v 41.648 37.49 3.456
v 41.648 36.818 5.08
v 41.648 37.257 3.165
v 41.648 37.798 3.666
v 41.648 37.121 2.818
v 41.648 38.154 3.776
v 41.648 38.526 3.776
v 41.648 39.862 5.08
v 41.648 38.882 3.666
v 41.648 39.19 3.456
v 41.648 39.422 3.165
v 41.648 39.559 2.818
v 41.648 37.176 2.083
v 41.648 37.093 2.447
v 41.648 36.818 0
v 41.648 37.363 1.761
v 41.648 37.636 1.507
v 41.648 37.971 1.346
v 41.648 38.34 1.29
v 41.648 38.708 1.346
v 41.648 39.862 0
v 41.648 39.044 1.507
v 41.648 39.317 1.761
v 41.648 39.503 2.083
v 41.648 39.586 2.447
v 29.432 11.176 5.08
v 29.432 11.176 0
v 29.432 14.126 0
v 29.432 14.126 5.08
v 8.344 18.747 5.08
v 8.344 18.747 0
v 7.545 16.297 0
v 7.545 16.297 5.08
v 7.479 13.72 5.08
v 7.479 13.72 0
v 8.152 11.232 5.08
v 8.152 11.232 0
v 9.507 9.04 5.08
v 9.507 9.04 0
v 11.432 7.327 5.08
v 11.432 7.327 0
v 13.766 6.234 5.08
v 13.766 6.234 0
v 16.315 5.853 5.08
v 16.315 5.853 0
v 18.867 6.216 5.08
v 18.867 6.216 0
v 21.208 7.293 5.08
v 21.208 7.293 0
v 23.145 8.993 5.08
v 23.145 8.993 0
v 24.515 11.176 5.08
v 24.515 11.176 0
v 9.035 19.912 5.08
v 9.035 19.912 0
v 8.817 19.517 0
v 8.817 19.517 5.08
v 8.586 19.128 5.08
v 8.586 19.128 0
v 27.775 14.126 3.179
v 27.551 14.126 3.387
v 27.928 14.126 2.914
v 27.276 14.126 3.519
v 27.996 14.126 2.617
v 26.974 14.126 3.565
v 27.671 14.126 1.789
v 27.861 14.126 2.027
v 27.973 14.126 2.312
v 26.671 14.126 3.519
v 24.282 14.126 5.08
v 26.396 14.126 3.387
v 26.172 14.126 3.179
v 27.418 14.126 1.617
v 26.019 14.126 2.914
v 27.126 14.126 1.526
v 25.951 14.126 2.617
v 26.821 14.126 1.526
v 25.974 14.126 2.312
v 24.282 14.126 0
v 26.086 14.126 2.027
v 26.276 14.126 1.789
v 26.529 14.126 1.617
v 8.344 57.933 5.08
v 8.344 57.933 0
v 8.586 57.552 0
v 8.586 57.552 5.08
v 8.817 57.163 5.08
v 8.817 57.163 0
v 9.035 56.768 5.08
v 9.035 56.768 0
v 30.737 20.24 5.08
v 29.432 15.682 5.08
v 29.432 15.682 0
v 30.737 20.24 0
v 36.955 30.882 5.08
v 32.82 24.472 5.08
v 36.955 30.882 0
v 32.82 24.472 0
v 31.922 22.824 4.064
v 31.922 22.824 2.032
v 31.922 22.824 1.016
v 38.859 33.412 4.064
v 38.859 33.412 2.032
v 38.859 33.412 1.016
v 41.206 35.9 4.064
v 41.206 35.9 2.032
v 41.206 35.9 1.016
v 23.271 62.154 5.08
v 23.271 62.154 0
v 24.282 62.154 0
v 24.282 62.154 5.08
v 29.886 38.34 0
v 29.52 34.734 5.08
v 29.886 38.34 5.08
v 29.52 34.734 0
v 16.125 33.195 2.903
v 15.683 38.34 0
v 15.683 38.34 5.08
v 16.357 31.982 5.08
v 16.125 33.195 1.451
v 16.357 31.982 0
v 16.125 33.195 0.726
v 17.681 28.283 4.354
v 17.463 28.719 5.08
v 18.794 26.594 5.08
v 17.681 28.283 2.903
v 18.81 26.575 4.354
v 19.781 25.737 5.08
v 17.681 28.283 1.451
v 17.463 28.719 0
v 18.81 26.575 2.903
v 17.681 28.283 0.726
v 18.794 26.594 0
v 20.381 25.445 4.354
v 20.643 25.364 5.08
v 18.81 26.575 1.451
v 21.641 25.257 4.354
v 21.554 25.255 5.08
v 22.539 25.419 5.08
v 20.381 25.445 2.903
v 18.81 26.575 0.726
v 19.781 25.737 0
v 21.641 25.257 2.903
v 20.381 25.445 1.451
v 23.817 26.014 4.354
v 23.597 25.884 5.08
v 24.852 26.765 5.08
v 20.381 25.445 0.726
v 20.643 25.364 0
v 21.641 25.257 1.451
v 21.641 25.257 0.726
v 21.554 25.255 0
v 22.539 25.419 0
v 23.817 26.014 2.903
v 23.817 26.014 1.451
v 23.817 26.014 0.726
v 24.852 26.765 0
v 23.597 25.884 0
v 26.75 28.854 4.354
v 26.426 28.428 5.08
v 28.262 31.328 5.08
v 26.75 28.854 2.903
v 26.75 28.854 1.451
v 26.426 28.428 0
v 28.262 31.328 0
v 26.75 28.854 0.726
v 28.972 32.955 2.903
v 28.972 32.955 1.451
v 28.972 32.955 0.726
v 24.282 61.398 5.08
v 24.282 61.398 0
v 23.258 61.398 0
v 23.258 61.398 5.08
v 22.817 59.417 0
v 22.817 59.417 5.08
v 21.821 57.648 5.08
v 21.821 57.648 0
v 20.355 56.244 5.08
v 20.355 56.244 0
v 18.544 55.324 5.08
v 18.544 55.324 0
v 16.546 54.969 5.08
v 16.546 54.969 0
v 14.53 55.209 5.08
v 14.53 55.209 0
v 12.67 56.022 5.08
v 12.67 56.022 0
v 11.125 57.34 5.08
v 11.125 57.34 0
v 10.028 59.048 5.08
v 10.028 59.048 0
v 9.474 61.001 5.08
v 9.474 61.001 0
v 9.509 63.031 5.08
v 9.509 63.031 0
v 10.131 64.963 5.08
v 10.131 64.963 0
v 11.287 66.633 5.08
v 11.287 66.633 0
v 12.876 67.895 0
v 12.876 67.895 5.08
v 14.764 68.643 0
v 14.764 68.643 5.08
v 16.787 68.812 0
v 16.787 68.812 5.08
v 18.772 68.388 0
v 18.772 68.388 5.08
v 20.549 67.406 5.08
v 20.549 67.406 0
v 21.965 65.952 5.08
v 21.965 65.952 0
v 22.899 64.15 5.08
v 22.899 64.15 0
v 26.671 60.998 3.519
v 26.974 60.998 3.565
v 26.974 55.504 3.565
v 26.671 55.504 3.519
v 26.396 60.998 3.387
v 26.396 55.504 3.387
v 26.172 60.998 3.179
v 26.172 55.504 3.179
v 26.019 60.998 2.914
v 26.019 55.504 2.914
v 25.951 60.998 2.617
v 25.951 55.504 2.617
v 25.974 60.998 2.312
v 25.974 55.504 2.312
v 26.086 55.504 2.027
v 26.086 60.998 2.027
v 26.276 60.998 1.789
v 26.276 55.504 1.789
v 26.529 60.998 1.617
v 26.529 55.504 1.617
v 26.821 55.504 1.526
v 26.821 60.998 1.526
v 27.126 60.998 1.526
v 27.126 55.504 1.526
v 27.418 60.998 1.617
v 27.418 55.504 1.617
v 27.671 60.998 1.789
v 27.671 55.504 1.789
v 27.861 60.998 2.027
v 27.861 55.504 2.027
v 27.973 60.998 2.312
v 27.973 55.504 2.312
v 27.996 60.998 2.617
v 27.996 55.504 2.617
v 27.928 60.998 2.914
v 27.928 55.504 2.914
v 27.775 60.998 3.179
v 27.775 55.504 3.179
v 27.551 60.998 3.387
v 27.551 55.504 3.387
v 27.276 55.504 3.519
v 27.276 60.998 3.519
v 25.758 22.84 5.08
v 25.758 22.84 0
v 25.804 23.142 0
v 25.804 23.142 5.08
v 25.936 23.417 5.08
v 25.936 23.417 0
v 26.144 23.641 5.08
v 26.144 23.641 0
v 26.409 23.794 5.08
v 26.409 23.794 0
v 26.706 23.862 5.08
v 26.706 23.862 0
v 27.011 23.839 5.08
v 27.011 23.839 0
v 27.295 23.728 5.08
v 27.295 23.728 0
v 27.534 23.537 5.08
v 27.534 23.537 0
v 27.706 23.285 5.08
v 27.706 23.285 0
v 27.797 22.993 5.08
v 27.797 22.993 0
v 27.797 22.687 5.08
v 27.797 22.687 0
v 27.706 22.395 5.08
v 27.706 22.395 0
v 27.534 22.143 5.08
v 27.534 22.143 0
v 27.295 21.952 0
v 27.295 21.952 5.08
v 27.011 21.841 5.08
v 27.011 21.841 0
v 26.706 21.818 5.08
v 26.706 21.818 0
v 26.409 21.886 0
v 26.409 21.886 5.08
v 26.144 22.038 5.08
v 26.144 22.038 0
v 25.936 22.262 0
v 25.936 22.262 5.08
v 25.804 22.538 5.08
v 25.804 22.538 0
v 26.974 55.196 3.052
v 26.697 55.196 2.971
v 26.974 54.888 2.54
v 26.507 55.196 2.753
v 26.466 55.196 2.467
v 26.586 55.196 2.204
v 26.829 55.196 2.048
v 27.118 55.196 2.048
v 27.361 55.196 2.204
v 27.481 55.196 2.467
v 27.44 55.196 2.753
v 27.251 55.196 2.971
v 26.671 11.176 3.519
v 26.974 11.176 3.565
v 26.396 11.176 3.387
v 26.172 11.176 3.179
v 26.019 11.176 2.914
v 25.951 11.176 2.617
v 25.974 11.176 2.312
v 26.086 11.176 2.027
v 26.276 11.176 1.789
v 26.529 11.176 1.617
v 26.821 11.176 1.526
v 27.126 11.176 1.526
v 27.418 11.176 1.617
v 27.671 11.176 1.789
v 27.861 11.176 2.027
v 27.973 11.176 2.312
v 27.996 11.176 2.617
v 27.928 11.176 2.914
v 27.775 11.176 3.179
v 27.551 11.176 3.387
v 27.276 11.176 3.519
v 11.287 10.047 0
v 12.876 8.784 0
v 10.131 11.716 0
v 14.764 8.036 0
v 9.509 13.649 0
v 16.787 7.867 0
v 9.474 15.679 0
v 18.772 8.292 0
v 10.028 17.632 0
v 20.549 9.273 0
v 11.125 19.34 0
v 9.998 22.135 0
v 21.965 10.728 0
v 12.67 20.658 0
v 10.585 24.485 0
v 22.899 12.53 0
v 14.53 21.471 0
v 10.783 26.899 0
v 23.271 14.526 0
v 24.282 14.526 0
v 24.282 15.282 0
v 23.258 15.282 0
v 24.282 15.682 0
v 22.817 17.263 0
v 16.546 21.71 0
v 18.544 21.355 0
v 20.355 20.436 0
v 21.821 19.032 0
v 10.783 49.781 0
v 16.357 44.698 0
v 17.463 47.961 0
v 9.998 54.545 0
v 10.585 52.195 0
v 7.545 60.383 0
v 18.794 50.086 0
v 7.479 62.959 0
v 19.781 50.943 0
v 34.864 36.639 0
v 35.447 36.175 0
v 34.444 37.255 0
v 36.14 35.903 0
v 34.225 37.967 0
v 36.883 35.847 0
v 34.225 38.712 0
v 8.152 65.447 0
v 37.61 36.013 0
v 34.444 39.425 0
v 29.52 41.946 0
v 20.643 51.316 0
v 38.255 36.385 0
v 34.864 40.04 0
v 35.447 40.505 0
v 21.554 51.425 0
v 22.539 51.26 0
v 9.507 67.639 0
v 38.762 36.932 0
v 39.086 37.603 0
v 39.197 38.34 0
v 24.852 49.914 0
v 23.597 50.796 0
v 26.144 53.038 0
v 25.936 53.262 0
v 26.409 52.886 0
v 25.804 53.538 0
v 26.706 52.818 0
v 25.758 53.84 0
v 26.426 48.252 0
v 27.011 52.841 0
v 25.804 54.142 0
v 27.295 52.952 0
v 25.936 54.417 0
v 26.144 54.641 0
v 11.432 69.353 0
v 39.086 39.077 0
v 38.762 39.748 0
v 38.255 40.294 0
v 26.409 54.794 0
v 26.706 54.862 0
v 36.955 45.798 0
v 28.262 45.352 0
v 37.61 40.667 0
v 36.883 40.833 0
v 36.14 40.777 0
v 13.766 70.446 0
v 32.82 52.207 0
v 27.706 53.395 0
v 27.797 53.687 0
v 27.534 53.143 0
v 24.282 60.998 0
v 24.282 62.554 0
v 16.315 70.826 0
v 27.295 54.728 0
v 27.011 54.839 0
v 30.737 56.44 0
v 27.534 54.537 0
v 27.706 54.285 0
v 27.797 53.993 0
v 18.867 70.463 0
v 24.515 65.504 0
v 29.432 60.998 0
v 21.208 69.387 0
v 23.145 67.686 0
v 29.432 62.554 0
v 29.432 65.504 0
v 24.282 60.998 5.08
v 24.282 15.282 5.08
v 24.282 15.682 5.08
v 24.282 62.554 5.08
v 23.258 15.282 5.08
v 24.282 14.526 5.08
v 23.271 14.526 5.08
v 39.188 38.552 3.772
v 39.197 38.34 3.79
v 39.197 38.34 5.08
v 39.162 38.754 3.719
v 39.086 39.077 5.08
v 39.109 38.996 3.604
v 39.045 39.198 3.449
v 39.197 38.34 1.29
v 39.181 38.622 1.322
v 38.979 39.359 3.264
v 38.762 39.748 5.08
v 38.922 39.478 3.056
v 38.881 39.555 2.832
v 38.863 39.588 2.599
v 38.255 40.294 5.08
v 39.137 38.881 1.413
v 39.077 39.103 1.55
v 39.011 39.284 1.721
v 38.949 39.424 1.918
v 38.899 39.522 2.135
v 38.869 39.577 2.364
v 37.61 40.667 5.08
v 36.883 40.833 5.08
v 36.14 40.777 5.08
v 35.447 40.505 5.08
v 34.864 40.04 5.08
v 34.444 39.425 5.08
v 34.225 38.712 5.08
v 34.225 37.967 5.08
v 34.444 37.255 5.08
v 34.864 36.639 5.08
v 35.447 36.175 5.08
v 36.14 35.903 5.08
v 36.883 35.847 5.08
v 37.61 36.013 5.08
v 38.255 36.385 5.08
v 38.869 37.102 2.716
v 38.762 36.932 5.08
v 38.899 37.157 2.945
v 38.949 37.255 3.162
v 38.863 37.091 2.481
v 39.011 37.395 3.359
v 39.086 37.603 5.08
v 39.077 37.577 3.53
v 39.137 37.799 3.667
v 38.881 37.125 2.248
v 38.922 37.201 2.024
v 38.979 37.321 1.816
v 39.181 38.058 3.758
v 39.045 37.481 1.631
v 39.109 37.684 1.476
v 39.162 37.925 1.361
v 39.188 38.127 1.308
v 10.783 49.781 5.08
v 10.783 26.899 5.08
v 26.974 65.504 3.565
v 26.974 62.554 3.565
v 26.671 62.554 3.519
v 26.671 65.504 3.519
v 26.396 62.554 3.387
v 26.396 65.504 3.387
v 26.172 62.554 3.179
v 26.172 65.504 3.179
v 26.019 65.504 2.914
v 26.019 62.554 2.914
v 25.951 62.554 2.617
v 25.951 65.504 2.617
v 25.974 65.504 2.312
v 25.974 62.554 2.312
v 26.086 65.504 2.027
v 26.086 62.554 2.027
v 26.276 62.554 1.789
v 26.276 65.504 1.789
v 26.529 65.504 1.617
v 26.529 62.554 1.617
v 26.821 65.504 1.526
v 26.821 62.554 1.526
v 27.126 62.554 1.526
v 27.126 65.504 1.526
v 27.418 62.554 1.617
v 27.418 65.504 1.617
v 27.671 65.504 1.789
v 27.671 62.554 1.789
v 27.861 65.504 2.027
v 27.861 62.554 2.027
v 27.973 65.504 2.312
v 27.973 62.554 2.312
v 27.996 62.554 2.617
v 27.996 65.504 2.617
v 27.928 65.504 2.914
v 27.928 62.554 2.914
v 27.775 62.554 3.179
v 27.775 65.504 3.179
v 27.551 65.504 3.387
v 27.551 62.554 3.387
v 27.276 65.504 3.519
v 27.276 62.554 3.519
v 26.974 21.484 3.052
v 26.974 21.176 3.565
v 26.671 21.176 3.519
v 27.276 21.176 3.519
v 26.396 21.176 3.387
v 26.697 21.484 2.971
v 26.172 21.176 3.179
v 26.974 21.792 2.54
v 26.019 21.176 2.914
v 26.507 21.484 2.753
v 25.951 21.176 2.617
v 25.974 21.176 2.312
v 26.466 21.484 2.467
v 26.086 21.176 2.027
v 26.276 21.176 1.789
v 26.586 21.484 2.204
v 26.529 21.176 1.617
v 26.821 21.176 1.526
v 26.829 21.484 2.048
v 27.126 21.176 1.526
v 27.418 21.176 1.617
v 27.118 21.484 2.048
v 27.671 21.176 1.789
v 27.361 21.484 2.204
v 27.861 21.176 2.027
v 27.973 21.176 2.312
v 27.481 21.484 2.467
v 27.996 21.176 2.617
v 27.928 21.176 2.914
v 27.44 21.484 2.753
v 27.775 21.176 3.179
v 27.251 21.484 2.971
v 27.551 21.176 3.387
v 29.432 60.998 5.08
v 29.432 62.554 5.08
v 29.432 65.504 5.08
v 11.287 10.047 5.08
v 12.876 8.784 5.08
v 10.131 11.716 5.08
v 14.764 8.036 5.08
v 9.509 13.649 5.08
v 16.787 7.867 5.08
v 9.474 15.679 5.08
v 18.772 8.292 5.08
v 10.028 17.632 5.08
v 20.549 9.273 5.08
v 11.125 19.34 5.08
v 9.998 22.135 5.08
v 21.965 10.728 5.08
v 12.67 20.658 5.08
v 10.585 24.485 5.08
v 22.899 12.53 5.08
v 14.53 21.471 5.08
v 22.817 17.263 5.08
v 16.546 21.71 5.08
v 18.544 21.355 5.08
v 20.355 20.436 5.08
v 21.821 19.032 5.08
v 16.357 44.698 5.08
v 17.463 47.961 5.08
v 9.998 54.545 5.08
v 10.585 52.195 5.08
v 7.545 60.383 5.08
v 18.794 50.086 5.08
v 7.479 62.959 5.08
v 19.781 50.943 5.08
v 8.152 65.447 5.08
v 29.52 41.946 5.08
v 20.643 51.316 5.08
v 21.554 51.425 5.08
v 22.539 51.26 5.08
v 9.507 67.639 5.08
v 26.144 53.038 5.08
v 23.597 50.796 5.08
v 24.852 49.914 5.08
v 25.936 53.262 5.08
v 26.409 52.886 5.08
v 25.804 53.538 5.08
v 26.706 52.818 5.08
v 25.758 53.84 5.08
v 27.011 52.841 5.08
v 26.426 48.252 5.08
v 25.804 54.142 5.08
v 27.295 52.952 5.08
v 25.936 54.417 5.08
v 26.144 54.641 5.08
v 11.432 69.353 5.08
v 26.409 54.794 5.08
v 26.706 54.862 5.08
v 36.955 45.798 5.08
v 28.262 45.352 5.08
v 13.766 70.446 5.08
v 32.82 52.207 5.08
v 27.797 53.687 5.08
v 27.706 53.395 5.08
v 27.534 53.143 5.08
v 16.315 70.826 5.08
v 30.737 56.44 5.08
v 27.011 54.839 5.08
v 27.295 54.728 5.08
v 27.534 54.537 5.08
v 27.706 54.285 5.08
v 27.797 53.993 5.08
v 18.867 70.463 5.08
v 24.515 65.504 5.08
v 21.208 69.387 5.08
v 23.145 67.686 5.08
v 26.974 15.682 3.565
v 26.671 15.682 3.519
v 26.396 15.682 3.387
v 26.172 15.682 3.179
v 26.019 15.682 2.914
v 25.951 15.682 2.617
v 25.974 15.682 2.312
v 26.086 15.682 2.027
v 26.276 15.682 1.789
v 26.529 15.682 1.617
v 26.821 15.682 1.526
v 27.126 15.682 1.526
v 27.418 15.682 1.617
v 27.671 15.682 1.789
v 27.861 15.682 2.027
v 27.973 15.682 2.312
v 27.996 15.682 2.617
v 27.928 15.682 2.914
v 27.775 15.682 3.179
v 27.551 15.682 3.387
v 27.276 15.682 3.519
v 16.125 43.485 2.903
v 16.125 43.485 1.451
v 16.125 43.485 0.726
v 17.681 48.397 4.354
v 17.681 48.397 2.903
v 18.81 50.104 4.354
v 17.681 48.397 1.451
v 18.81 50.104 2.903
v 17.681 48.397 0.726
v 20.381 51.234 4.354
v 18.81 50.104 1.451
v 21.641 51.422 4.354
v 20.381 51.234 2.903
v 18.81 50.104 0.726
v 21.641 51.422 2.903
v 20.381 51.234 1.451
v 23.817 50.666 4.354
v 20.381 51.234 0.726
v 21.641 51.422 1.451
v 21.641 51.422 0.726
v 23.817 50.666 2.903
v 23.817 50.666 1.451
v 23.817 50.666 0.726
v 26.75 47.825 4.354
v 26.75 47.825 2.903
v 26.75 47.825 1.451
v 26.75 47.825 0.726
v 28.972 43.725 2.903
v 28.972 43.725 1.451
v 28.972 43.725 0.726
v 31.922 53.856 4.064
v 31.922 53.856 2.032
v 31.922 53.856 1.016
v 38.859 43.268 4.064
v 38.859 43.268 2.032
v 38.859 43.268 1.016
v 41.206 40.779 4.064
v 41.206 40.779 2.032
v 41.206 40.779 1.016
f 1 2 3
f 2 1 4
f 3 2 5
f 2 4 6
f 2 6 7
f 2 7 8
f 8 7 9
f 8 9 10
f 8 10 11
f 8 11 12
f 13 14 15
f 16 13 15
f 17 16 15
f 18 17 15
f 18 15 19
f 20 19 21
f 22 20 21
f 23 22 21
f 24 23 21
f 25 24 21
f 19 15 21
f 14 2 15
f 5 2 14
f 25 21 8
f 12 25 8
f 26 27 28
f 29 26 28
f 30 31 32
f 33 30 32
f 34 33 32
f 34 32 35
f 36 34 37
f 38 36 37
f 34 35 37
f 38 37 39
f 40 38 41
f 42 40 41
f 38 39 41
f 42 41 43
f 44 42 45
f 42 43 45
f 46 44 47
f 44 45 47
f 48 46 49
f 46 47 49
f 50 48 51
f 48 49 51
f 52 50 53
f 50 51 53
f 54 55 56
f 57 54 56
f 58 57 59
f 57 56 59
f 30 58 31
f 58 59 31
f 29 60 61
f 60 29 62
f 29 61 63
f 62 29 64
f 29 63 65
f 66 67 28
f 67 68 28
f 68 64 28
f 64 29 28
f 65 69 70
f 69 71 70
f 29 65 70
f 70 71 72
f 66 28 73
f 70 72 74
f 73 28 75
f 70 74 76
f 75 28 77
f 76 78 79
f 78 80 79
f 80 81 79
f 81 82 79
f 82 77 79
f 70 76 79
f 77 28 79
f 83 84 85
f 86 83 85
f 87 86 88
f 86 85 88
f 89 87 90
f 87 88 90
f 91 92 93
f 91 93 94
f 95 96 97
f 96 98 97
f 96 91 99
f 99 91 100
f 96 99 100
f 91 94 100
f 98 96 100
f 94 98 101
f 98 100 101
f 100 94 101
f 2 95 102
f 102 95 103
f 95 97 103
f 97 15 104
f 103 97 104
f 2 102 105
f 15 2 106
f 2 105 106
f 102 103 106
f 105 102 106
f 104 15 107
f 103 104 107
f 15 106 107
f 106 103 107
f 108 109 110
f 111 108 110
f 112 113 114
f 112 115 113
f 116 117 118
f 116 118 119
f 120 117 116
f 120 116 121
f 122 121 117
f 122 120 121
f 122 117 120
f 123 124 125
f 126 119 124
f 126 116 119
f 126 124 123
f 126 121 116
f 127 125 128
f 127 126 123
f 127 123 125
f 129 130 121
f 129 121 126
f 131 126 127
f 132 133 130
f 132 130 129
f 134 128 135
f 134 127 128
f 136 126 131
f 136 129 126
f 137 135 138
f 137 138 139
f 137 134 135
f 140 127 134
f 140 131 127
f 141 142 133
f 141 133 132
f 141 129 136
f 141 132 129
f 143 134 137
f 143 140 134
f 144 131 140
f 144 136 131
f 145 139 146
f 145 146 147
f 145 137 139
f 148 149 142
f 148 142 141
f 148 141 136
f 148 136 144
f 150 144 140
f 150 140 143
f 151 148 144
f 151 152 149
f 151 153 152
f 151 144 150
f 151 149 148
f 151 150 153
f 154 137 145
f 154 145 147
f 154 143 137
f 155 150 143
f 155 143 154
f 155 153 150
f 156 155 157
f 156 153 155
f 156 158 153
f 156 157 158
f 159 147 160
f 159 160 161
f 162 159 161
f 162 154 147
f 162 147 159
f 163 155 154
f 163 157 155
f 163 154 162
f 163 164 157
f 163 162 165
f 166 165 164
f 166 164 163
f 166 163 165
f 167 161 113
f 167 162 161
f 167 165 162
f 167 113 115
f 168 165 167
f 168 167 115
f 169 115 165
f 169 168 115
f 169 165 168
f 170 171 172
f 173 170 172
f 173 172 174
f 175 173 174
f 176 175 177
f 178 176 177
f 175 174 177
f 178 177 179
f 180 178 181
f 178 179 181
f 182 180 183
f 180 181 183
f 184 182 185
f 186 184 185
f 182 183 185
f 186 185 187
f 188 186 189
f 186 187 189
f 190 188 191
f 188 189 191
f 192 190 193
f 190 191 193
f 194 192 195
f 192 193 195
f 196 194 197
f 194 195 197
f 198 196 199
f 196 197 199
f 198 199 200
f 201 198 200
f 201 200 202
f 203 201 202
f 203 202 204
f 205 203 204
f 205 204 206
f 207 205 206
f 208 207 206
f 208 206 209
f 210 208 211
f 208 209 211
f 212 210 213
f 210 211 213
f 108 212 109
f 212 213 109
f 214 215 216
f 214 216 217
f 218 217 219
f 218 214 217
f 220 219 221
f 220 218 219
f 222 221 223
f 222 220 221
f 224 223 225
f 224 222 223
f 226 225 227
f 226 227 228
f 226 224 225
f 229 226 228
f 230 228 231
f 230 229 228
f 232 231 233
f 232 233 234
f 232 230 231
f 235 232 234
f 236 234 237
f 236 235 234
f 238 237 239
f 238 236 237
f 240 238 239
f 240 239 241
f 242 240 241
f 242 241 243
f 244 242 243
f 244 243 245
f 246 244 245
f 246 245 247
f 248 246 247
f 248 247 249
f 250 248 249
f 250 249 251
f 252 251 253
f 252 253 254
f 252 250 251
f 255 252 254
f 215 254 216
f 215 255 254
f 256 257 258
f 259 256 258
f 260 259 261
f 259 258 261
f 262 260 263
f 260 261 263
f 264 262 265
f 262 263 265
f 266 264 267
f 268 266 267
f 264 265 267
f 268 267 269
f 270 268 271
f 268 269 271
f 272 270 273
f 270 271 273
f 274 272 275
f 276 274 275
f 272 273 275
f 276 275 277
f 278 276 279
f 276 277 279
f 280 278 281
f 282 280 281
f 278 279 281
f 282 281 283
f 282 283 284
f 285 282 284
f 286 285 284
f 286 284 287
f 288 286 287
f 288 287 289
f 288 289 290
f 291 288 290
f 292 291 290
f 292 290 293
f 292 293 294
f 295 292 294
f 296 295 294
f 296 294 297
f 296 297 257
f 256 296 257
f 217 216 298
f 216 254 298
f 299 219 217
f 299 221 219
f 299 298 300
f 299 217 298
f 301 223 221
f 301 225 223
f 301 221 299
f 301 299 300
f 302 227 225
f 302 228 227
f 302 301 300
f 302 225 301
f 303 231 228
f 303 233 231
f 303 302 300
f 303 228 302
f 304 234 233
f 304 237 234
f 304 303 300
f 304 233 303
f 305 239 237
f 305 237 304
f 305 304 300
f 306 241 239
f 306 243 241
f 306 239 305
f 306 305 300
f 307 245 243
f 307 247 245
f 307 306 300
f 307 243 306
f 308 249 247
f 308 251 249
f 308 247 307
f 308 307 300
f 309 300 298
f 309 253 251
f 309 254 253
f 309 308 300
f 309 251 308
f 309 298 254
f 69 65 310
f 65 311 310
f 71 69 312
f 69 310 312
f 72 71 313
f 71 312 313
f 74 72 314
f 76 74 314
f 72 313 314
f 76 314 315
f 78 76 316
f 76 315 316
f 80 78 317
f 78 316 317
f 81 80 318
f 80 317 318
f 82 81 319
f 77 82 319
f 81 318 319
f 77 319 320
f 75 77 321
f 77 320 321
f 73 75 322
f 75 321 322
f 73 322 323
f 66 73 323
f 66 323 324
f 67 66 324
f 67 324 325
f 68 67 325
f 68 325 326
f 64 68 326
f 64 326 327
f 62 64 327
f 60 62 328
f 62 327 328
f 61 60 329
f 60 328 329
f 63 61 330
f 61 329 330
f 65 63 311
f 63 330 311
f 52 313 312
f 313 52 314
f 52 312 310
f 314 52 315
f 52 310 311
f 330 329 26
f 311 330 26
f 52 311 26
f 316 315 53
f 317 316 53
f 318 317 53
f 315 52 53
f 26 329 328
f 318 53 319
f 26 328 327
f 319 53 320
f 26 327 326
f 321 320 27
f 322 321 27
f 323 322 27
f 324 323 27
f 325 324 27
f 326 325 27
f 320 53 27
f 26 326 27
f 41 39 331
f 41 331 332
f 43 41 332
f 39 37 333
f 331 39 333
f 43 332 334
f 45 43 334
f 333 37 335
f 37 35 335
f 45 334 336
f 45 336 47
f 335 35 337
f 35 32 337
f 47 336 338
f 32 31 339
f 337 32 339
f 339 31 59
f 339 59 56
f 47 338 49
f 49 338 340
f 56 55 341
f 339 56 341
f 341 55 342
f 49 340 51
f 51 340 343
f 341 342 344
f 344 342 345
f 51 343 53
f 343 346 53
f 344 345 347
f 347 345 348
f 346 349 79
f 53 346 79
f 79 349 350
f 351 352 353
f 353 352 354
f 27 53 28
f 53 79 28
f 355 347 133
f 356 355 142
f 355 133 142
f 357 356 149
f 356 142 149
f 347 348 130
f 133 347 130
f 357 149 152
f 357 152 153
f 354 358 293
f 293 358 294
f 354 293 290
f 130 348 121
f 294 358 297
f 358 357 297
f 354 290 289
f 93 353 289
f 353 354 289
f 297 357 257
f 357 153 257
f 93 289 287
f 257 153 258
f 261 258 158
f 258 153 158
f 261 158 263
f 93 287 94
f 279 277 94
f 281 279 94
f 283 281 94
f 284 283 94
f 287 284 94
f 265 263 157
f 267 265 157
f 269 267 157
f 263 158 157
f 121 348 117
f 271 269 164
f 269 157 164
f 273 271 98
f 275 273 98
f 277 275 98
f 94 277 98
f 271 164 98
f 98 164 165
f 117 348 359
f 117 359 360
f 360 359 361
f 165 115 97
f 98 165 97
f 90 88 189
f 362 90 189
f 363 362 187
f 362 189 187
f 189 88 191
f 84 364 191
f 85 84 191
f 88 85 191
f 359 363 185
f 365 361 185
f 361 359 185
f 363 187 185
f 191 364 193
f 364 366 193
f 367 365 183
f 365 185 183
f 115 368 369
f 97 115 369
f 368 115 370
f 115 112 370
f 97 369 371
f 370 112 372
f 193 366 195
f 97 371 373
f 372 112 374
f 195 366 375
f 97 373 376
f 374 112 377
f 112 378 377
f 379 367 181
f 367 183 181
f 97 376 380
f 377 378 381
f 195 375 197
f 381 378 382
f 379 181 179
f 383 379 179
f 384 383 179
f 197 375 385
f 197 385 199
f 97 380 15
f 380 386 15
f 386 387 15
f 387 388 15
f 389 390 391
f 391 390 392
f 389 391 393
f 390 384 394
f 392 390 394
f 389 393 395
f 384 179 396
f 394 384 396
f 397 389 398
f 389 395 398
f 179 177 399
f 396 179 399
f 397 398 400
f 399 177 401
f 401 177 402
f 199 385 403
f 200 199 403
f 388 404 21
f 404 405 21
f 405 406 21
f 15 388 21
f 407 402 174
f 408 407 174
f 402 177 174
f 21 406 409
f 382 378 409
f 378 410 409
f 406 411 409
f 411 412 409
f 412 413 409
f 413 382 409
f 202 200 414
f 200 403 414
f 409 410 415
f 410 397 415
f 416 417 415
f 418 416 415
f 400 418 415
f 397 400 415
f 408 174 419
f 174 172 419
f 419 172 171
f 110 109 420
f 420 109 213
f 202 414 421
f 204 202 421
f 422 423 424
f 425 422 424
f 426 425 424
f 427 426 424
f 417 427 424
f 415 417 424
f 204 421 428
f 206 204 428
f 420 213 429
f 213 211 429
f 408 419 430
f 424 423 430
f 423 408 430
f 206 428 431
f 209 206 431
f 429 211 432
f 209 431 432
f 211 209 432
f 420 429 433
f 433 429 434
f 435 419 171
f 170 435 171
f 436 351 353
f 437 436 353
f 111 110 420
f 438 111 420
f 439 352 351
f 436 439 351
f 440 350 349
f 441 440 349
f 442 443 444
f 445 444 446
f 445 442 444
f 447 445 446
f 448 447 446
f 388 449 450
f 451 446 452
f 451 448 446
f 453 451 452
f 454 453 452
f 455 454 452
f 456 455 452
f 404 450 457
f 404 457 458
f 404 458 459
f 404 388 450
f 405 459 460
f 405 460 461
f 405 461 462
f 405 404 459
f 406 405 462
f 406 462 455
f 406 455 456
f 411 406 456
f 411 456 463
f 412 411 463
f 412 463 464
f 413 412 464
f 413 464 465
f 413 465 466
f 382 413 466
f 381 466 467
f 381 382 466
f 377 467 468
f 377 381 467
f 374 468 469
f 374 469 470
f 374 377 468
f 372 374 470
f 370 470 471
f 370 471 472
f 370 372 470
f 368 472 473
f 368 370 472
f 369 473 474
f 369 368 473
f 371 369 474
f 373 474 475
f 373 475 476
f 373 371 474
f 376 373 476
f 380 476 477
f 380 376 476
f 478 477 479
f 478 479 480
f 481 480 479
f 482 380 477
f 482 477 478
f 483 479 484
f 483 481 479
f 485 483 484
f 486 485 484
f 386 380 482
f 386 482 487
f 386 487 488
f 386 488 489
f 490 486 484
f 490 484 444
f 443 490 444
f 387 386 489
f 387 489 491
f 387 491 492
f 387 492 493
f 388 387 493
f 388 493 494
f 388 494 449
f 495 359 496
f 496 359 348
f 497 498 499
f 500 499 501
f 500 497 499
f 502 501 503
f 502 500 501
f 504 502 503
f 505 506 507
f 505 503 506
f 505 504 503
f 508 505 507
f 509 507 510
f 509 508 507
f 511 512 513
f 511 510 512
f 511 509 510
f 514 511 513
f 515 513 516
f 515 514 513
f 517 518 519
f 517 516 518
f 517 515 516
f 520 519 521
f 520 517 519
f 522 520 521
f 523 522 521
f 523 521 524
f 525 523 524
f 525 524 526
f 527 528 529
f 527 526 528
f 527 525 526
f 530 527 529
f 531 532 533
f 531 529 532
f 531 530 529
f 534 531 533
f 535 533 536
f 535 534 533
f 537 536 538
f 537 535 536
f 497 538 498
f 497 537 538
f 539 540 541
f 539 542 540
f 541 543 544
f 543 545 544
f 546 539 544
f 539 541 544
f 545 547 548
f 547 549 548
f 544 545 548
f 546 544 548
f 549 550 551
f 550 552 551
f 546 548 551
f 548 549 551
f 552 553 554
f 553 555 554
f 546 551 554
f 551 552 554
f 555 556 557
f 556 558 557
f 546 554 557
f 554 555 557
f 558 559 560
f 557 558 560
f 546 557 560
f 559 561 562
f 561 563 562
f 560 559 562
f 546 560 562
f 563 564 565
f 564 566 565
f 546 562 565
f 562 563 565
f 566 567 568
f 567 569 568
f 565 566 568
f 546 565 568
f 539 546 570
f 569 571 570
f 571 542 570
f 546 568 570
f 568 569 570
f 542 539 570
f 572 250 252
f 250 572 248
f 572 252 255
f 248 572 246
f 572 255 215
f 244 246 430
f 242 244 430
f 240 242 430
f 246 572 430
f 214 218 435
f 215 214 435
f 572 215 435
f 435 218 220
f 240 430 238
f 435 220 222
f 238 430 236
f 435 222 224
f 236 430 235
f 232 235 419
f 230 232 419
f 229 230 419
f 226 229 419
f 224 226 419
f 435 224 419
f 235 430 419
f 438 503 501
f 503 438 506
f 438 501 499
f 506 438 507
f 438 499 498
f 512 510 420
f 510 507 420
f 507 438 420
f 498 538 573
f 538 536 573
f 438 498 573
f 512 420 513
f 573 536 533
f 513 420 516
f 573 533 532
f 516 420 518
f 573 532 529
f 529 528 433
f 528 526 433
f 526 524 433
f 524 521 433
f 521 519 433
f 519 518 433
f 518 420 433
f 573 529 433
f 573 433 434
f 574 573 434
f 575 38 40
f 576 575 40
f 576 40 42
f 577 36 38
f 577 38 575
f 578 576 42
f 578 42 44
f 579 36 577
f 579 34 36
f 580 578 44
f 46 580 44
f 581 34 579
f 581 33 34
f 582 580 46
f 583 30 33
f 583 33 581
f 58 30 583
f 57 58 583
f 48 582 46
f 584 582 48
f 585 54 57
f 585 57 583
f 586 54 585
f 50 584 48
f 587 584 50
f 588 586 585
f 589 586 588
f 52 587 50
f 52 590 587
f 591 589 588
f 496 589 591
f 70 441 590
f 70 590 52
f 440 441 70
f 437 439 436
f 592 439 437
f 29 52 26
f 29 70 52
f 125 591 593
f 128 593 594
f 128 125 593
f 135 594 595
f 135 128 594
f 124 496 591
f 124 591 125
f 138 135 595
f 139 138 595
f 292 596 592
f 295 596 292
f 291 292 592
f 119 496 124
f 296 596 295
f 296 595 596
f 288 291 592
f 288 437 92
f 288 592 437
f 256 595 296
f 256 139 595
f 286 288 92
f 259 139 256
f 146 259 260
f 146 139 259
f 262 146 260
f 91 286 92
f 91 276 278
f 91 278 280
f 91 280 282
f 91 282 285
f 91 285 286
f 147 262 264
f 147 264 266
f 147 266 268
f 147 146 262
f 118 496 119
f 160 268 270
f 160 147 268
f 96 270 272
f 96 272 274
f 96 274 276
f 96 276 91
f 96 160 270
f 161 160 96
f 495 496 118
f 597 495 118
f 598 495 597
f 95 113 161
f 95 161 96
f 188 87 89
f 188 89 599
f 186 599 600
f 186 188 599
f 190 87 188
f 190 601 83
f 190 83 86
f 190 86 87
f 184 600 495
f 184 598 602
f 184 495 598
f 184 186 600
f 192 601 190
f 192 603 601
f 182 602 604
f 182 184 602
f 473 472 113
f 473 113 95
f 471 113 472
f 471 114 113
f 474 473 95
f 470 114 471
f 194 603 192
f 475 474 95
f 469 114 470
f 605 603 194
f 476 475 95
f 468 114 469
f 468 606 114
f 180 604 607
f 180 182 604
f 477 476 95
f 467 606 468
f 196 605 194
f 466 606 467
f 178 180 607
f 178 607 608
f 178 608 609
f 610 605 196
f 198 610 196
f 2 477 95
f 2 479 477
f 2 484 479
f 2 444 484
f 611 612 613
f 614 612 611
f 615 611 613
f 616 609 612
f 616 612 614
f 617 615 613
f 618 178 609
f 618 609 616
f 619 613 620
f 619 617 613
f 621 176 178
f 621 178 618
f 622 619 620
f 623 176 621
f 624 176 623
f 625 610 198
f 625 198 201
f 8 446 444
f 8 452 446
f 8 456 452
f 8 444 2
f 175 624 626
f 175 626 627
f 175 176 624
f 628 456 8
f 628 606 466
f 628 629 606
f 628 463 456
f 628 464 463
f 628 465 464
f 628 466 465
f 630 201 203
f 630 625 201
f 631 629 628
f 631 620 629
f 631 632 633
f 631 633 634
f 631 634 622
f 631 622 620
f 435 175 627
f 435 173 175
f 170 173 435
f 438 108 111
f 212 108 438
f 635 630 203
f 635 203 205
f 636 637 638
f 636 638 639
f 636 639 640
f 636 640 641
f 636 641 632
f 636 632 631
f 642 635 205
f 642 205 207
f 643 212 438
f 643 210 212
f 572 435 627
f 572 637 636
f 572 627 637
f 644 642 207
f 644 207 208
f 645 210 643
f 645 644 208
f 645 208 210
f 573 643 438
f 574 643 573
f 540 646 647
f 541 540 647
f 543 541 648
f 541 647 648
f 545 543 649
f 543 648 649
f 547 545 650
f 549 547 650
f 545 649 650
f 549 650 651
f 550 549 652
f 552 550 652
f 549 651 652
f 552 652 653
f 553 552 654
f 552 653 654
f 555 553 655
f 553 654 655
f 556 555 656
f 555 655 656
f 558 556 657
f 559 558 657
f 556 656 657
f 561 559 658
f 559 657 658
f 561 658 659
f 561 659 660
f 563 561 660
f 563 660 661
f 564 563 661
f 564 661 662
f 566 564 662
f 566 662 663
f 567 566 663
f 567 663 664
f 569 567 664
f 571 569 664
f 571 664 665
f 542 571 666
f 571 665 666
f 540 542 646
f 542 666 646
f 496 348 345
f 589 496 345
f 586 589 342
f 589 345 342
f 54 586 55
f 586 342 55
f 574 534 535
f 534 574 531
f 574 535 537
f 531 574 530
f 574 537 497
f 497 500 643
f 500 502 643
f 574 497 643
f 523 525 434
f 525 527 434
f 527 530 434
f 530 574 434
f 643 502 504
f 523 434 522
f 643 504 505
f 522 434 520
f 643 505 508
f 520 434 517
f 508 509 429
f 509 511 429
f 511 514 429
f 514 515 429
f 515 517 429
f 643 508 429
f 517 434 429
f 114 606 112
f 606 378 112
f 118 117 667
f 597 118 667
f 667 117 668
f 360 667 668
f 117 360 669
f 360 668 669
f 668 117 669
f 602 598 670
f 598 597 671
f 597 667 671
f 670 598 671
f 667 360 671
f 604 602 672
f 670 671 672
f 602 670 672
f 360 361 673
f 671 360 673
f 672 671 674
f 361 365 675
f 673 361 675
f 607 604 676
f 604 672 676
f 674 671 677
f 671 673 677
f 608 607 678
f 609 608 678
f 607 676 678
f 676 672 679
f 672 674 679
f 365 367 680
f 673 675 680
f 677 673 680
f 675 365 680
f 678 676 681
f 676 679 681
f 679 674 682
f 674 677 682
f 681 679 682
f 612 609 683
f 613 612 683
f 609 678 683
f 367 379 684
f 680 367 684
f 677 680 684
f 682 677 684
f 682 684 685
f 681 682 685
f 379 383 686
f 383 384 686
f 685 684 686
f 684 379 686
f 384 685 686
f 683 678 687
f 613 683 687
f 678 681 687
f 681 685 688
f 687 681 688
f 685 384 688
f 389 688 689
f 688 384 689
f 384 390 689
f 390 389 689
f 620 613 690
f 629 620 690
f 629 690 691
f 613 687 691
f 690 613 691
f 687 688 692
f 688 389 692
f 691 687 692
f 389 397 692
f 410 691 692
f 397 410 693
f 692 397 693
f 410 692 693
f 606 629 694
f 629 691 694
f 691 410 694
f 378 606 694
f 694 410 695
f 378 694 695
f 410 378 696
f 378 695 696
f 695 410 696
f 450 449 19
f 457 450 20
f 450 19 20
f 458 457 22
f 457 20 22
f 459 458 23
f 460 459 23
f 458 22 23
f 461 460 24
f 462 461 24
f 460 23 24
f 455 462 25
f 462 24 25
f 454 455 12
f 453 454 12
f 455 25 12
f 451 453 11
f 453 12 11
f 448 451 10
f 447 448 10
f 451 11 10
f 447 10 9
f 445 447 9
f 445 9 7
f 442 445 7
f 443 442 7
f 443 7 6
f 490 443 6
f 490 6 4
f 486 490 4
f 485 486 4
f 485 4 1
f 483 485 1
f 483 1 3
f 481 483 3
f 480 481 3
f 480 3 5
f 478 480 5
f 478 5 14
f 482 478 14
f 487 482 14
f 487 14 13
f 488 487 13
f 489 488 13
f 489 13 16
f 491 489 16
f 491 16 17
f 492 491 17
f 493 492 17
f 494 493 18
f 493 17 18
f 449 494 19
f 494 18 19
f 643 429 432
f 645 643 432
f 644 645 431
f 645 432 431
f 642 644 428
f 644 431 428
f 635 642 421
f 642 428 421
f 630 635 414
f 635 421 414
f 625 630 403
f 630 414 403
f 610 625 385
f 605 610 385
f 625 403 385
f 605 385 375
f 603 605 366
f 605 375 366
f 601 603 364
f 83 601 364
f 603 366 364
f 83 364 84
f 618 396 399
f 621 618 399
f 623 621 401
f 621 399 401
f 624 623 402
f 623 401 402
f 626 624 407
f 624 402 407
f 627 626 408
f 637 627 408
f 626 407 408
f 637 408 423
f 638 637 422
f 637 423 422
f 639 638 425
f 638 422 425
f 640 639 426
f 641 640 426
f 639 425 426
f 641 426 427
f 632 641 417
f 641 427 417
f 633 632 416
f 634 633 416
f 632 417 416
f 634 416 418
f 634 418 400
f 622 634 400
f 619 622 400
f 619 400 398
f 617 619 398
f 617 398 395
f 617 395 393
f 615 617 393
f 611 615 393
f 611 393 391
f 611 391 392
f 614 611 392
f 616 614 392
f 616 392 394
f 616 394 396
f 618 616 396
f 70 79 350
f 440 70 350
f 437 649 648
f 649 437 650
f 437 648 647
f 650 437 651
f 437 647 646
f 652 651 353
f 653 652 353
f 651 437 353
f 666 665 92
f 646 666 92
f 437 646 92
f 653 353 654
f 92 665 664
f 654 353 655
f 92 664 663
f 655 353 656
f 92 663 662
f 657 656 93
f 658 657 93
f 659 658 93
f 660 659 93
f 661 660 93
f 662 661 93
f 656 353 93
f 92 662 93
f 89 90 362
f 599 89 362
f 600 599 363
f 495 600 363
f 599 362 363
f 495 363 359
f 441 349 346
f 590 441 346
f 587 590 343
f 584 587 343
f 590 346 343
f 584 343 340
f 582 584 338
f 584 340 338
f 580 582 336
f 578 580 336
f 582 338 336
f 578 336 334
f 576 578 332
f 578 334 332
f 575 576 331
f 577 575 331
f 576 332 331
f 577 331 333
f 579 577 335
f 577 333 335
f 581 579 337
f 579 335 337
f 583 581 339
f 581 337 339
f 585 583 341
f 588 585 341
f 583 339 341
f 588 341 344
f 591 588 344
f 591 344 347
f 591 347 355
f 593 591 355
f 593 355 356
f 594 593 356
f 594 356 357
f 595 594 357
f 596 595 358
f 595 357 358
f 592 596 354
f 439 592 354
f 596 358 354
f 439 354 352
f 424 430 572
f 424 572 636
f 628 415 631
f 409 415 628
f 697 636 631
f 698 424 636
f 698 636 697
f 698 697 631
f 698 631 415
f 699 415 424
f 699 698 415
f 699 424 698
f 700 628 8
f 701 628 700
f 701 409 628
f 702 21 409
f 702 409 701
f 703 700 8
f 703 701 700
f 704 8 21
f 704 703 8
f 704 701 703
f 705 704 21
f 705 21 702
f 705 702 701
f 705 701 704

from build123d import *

# Parameters (mm, degrees)
SCHIZZO1_R                     = 2.5
ESTRUSIONE_ESTRUSIONE1_DEPTH   = 5.08
FORO_FILETTATO_M2_5X0_45_1_D   = 2.05
FORO_FILETTATO_M3X0_5_1_REACH  = 80.829
FORO_FILETTATO_M3X0_5_1_BORE_R = 1.25


with BuildPart() as part:
    # Schizzo1 → Estrusione-Estrusione1 (new body)
    with BuildSketch(Plane.XY):
        with BuildLine():
            Line((10.78299118, 49.780959651), (10.78299118, 26.898787325))
            ThreePointArc((10.78299118, 26.898787325), (10.339487436, 23.297689716), (9.035482204, 19.911811705))
            ThreePointArc((9.035482204, 19.911811705), (8.70291473, 19.32141597), (8.343745321, 18.7468156))
            ThreePointArc((8.343745321, 18.7468156), (12.559578595, 6.695692747), (24.514917355, 11.175948023))
            Line((24.514917355, 11.175948023), (29.432282014, 11.175948023))
            Line((29.432282014, 11.175948023), (29.432282014, 14.125948023))
            Line((29.432282014, 14.125948023), (24.282282014, 14.125948023))
            Line((24.282282014, 14.125948023), (24.282282014, 14.525948023))
            Line((24.282282014, 14.525948023), (23.271153051, 14.525948023))
            ThreePointArc((23.271153051, 14.525948023), (9.416981792, 14.662564542), (23.257993682, 15.281527553))
            Line((23.257993682, 15.281527553), (24.282282014, 15.281527553))
            Line((24.282282014, 15.281527553), (24.282282014, 15.681527553))
            Line((24.282282014, 15.681527553), (29.432282014, 15.681527553))
            add(Edge.make_bspline(
                [(29.432282014, 15.681527553), (30.28849394, 20.768740112), (33.989676552, 26.542735909), (38.12926078, 32.628075923), (40.026271169, 34.752771823), (41.110826736, 35.725265219), (41.648042989, 36.454929263), (41.648042989, 36.817827012)],
                knots=[0, 0, 0, 0, 0.614811257, 0.820091791, 0.896456597, 0.958730004, 1, 1, 1, 1], degree=3))
            Line((41.648042989, 36.817827012), (41.648042989, 39.861919964))
            add(Edge.make_bspline(
                [(29.432282014, 60.998219422), (30.28849394, 55.911006863), (33.989676552, 50.137011066), (38.12926078, 44.051671053), (40.026271169, 41.926975153), (41.110826736, 40.954481756), (41.648042989, 40.224817712), (41.648042989, 39.861919964)],
                knots=[0, 0, 0, 0, 0.614811257, 0.820091791, 0.896456597, 0.958730004, 1, 1, 1, 1], degree=3))
            Line((29.432282014, 60.998219422), (24.282282014, 60.998219422))
            Line((24.282282014, 60.998219422), (24.282282014, 61.398219422))
            Line((24.282282014, 61.398219422), (23.257993682, 61.398219422))
            ThreePointArc((23.257993682, 61.398219422), (9.416981792, 62.017182434), (23.271153051, 62.153798952))
            Line((23.271153051, 62.153798952), (24.282282014, 62.153798952))
            Line((24.282282014, 62.153798952), (24.282282014, 62.553798952))
            Line((24.282282014, 62.553798952), (29.432282014, 62.553798952))
            Line((29.432282014, 62.553798952), (29.432282014, 65.503798952))
            Line((29.432282014, 65.503798952), (24.514917355, 65.503798952))
            ThreePointArc((24.514917355, 65.503798952), (12.559578595, 69.984054228), (8.343745321, 57.932931375))
            ThreePointArc((8.343745321, 57.932931375), (8.70291473, 57.358331006), (9.035482204, 56.767935271))
            ThreePointArc((9.035482204, 56.767935271), (10.339487436, 53.382057259), (10.78299118, 49.780959651))
        make_face()
        with BuildLine():
            add(Edge.make_bspline(
                [(15.682597142, 38.339873488), (15.862127321, 34.83902794), (16.076956788, 30.195397892), (19.436029343, 25.500544959), (22.003237557, 25.120656017), (24.462992199, 26.161428979), (27.017677892, 28.909232559), (29.309944893, 33.118967607), (29.972256674, 36.502062861), (29.886078718, 38.339873488)],
                knots=[0, 0, 0, 0, 0.321954935, 0.444159149, 0.483908226, 0.555795087, 0.68318302, 0.828712277, 1, 1, 1, 1], degree=3))
            add(Edge.make_bspline(
                [(15.682597142, 38.339873488), (15.862127321, 41.840719035), (16.076956788, 46.484349083), (19.436029343, 51.179202017), (22.003237557, 51.559090959), (24.462992199, 50.518317996), (27.017677892, 47.770514416), (29.309944893, 43.560779368), (29.972256674, 40.177684115), (29.886078718, 38.339873488)],
                knots=[0, 0, 0, 0, 0.321954935, 0.444159149, 0.483908226, 0.555795087, 0.68318302, 0.828712277, 1, 1, 1, 1], degree=3))
        make_face(mode=Mode.SUBTRACT)
        with Locations((36.696640264, 38.339873488)):
            Circle(SCHIZZO1_R, mode=Mode.SUBTRACT)
    extrude(amount=ESTRUSIONE_ESTRUSIONE1_DEPTH)

    # Foro filettato M2.5x0.45-1 (through all)
    with Locations(Plane.XY.offset(5.08)):
        with Locations((26.78299118, 22.839873488), (26.78299118, 53.839873488)):
            Hole(FORO_FILETTATO_M2_5X0_45_1_D / 2)

    # Foro filettato M3x0.5-1 bore → Foro filettato M3x0.5-1 (cut, up to next)
    with BuildSketch(Plane(origin=(41.648042989, 0, 0), x_dir=(0, 0, -1), z_dir=(1, 0, 0)), mode=Mode.PRIVATE) as foro_filettato_m3x0_5_1_sk1:
        with Locations((-2.54, 38.339873488)):
            Circle(FORO_FILETTATO_M3X0_5_1_BORE_R)
    foro_filettato_m3x0_5_1_tool1 = extrude(foro_filettato_m3x0_5_1_sk1.sketch, amount=-FORO_FILETTATO_M3X0_5_1_REACH, mode=Mode.PRIVATE) & part.part
    add(foro_filettato_m3x0_5_1_tool1.solids().sort_by_distance((41.648043, 38.339873, 2.54))[0], mode=Mode.SUBTRACT)

    # Schizzo7 → Foro filettato M2.5x0.45-2 (revolve, cut)
    with BuildSketch(Plane(origin=(26.973599685, 65.503798952, 2.54), x_dir=(0, 0, 1), z_dir=(1, 0, 0))):
        Polygon((0, 0), (0, 10.615882135), (1.025, 10), (1.025, 0), align=None)
    foro_filettato_m2_5x0_45_2 = revolve(axis=Axis((26.973599685, 71.853798952, 2.54), (0, -1, 0)), mode=Mode.SUBTRACT)

    # Specchia1: Foro filettato M2.5x0.45-2 across plane
    add(foro_filettato_m2_5x0_45_2.mirror(Plane.ZX.offset(38.339873488)), mode=Mode.SUBTRACT)


solid = part.part
